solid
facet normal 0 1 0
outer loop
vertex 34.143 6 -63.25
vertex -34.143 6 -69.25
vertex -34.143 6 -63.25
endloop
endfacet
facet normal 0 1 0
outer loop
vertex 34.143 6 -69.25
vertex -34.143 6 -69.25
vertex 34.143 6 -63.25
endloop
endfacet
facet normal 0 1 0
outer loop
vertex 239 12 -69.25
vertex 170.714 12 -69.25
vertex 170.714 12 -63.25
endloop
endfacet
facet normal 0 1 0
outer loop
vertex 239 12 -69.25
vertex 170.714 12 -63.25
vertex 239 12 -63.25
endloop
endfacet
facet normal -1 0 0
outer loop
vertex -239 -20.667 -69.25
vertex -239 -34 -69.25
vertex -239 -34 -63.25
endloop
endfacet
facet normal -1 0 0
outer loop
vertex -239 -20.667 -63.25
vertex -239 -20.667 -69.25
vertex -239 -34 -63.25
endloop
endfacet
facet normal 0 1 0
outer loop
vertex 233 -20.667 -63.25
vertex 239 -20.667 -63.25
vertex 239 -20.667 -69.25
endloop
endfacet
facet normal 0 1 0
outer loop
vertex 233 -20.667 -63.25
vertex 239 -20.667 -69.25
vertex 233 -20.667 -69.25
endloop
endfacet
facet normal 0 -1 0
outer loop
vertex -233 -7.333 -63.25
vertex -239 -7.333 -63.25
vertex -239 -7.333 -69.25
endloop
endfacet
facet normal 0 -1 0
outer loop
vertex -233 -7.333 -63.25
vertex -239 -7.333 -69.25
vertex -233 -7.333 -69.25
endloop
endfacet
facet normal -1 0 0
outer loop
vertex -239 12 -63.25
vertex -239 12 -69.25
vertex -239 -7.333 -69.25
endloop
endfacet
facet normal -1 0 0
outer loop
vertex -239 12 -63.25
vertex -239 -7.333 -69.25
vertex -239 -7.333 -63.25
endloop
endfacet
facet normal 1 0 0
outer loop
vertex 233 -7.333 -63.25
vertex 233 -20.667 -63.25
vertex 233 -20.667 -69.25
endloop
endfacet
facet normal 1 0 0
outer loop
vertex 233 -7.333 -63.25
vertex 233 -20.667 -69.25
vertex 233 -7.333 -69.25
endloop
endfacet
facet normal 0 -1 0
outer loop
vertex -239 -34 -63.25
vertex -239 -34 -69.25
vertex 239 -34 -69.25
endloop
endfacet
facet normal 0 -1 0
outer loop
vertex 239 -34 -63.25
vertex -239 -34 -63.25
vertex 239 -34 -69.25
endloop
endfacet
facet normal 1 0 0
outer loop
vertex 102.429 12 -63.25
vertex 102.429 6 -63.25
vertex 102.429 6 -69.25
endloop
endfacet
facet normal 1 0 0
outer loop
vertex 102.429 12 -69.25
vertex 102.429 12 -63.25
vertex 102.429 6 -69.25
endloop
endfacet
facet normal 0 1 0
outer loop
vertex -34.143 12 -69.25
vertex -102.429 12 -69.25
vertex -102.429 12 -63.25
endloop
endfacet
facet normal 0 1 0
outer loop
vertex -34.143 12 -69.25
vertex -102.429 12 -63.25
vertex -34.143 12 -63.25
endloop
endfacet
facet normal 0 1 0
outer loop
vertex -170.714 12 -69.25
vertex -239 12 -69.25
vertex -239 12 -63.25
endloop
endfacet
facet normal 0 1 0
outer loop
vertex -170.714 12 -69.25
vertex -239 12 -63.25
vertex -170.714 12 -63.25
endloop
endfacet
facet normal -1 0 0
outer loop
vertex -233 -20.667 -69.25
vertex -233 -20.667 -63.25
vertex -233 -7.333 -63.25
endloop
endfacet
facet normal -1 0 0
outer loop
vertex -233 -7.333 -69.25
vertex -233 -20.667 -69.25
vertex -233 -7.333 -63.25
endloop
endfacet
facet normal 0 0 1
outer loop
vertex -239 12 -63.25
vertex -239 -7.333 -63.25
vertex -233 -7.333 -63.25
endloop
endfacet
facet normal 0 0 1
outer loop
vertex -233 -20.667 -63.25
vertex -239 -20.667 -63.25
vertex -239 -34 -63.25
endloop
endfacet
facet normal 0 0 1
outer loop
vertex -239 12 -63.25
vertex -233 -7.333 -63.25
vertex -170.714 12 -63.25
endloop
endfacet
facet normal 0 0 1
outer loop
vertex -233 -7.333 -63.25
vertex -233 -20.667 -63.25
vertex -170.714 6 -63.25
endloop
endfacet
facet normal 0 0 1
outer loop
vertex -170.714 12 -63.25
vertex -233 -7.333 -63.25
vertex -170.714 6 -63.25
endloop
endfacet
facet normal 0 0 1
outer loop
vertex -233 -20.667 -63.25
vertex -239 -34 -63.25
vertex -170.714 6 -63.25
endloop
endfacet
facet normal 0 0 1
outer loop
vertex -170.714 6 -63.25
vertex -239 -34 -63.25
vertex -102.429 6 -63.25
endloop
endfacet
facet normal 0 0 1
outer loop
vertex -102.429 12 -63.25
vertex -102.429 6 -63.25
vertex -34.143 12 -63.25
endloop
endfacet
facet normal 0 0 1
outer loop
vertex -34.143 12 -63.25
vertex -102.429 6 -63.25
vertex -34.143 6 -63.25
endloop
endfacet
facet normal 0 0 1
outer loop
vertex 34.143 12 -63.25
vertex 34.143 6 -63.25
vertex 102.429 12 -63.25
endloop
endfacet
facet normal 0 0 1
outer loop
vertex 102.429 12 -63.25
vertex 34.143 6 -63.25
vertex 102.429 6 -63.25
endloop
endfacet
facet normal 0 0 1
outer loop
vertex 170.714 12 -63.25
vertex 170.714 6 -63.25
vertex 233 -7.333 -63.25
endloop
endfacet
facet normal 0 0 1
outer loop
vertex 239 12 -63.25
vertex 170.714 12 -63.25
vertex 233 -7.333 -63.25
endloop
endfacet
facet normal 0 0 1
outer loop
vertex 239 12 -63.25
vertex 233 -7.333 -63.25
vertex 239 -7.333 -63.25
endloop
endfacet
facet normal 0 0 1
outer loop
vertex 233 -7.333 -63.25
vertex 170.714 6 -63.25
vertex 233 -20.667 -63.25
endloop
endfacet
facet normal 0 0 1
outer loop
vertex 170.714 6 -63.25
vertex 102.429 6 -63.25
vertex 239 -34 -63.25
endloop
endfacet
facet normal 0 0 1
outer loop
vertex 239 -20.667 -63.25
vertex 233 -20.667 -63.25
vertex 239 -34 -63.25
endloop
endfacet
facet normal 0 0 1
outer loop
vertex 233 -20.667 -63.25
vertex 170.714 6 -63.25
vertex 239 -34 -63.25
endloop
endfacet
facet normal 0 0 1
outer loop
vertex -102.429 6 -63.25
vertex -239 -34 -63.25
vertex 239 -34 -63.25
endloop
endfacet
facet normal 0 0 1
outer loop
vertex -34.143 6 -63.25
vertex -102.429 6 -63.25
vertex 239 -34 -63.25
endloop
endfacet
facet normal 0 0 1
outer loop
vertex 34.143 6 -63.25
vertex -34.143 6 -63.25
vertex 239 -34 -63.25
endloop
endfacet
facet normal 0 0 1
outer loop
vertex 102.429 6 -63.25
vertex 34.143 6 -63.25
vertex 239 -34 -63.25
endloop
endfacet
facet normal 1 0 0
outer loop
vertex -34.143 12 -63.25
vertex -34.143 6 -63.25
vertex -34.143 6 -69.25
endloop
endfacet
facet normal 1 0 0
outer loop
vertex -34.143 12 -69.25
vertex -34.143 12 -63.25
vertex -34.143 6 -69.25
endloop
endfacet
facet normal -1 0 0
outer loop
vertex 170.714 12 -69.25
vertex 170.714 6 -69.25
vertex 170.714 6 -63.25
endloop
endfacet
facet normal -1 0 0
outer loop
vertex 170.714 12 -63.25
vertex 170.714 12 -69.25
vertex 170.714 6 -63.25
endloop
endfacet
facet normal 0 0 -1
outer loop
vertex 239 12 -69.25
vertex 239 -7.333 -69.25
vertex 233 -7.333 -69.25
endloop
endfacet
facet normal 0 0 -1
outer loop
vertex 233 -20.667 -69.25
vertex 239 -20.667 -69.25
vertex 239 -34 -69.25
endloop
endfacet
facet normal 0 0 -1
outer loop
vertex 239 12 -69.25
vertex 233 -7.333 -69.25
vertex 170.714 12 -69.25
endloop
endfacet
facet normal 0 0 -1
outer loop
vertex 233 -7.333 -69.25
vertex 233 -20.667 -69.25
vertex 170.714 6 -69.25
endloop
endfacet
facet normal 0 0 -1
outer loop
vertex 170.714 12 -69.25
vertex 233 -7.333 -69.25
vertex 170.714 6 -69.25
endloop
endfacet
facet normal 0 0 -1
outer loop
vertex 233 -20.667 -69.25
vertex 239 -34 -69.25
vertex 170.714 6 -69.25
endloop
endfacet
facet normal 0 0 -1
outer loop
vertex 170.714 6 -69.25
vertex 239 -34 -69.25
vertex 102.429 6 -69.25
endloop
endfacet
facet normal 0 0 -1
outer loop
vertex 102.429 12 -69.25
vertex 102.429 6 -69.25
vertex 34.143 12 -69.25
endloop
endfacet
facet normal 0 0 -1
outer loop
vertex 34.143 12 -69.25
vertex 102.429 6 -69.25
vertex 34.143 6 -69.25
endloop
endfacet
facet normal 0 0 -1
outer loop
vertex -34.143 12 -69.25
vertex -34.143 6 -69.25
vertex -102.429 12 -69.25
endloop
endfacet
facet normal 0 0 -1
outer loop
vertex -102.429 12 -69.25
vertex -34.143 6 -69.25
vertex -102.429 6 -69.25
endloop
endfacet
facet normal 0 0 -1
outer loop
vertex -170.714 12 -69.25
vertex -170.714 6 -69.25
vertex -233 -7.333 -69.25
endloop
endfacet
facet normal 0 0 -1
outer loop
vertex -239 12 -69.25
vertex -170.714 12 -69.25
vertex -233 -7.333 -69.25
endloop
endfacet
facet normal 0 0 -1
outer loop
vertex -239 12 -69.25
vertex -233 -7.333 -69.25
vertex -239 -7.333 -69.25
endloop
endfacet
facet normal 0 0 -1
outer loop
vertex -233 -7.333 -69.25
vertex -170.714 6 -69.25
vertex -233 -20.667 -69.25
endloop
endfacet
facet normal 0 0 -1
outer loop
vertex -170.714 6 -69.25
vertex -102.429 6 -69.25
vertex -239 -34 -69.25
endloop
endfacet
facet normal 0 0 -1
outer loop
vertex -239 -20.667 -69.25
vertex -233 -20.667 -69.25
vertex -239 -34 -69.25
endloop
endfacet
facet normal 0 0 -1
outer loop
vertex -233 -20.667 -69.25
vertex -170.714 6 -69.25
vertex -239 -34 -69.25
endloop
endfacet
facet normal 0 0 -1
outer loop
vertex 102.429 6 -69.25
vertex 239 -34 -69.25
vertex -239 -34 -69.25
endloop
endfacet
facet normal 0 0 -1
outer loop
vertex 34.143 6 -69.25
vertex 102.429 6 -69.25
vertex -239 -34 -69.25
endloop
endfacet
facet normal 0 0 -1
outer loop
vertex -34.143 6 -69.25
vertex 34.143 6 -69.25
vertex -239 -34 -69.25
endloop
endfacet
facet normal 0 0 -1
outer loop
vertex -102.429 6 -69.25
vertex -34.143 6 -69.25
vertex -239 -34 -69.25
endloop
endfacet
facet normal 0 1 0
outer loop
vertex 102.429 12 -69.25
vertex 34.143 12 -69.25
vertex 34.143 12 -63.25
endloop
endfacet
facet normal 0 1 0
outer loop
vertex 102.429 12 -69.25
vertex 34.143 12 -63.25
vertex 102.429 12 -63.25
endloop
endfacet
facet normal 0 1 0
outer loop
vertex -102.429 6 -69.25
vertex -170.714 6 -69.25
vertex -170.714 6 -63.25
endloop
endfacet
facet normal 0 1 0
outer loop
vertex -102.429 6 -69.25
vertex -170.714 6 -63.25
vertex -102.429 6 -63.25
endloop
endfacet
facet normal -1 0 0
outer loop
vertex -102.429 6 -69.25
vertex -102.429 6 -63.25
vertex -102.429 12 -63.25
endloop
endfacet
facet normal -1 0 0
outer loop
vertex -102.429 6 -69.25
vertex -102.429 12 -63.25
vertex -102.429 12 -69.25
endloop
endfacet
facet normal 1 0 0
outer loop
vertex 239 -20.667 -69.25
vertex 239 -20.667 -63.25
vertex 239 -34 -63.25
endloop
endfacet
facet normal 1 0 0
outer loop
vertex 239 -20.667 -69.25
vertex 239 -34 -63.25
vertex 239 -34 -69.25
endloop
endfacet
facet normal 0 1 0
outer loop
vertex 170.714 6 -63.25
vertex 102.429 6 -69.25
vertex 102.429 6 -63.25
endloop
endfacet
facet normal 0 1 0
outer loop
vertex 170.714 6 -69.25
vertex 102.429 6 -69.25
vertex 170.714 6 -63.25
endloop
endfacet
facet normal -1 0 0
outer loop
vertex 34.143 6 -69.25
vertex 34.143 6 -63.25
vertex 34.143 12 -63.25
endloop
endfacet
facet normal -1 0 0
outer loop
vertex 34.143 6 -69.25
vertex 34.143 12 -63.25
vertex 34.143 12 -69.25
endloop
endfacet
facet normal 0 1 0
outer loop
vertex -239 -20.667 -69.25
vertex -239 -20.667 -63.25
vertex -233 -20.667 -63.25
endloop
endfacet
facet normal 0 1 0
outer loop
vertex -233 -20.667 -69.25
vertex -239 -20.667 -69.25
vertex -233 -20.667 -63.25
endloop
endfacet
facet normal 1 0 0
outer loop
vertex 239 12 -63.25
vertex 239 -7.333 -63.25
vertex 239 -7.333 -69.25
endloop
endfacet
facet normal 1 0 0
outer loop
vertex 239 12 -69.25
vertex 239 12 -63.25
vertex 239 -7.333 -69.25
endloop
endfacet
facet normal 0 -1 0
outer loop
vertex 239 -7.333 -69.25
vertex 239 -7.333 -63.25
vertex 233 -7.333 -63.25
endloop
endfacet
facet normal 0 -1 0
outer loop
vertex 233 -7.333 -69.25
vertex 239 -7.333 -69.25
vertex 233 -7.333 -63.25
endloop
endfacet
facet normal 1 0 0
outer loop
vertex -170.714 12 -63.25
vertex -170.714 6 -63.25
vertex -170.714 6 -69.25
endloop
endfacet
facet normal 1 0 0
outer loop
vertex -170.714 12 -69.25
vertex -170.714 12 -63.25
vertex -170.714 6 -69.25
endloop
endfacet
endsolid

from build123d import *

# Parameters (mm, degrees)
SKETCH1_W               = 466
SKETCH1_H               = 126.5
BOSS_EXTRUDE1_DEPTH     = 6
SKETCH2_W               = 68.285714285
SKETCH2_H               = 6
SKETCH2_W_2             = 68.285714286
BOSS_EXTRUDE2_DEPTH     = 40
SKETCH1_2_W             = 466
SKETCH1_2_H             = 126.5
CUT_EXTRUDE1_DEPTH      = 7
CUT_EXTRUDE1_DEPTH_BACK = 35
SKETCH2_4_W             = 68.285714286
SKETCH2_4_H             = 6
BOSS_EXTRUDE3_DEPTH     = 6
SKETCH3_W               = 6
SKETCH3_H               = 13.333333334
CUT_EXTRUDE2_DEPTH      = 6


with BuildPart() as part:
    # Sketch1 → Boss-Extrude1 (new body)
    with BuildSketch(Plane(origin=(0, 0, 0), x_dir=(1, 0, 0), z_dir=(0, 1, 0))):
        Rectangle(SKETCH1_W, SKETCH1_H)
    extrude(amount=BOSS_EXTRUDE1_DEPTH)

    # Sketch2 → Boss-Extrude2 (add)
    with BuildSketch(Plane(origin=(0, 6, 0), x_dir=(1, 0, 0), z_dir=(0, 1, 0))):
        Polygon((-239, 69.25), (-239, 63.25), (-233, 63.25), (-170.714285714, 63.25), (-170.714285714, 69.25), align=None)
        with Locations((-136.571428572, 66.25)):
            Rectangle(SKETCH2_W, SKETCH2_H)
        with Locations((-68.285714286, 66.25)):
            Rectangle(SKETCH2_W_2, SKETCH2_H)
        with Locations((0, 66.25)):
            Rectangle(SKETCH2_W_2, SKETCH2_H)
        with Locations((68.285714286, 66.25)):
            Rectangle(SKETCH2_W_2, SKETCH2_H)
        with Locations((136.571428572, 66.25)):
            Rectangle(SKETCH2_W, SKETCH2_H)
        Polygon((233, 63.25), (239, 63.25), (239, 69.25), (170.714285714, 69.25), (170.714285714, 63.25), align=None)
    extrude(amount=-BOSS_EXTRUDE2_DEPTH)

    # Sketch1<2> → Cut-Extrude1 (cut, two sides)
    with BuildSketch(Plane(origin=(0, 0, 0), x_dir=(1, 0, 0), z_dir=(0, 1, 0))) as cut_extrude1_sk:
        Rectangle(SKETCH1_2_W, SKETCH1_2_H)
    extrude(amount=CUT_EXTRUDE1_DEPTH, mode=Mode.SUBTRACT)
    extrude(cut_extrude1_sk.sketch, amount=-CUT_EXTRUDE1_DEPTH_BACK, mode=Mode.SUBTRACT)

    # Sketch2<4> → Boss-Extrude3 (add)
    with BuildSketch(Plane(origin=(0, 6, 0), x_dir=(1, 0, 0), z_dir=(0, 1, 0))):
        Polygon((-239, 69.25), (-239, 63.25), (-233, 63.25), (-170.714285714, 63.25), (-170.714285714, 69.25), align=None)
        with Locations((-68.285714286, 66.25)):
            Rectangle(SKETCH2_4_W, SKETCH2_4_H)
        with Locations((68.285714286, 66.25)):
            Rectangle(SKETCH2_4_W, SKETCH2_4_H)
        Polygon((233, 63.25), (239, 63.25), (239, 69.25), (170.714285714, 69.25), (170.714285714, 63.25), align=None)
    extrude(amount=BOSS_EXTRUDE3_DEPTH)

    # Sketch3 → Cut-Extrude2 (cut)
    with BuildSketch(Plane.XY.offset(-63.25)):
        with Locations((-236, -14)):
            Rectangle(SKETCH3_W, SKETCH3_H)
    cut_extrude2 = extrude(amount=-CUT_EXTRUDE2_DEPTH, mode=Mode.SUBTRACT)

    # Mirror1: Cut-Extrude2 across plane
    add(cut_extrude2.mirror(Plane(origin=(0, 0, 0), x_dir=(0, 0, 1), z_dir=(1, 0, 0))), mode=Mode.SUBTRACT)


solid = part.part
